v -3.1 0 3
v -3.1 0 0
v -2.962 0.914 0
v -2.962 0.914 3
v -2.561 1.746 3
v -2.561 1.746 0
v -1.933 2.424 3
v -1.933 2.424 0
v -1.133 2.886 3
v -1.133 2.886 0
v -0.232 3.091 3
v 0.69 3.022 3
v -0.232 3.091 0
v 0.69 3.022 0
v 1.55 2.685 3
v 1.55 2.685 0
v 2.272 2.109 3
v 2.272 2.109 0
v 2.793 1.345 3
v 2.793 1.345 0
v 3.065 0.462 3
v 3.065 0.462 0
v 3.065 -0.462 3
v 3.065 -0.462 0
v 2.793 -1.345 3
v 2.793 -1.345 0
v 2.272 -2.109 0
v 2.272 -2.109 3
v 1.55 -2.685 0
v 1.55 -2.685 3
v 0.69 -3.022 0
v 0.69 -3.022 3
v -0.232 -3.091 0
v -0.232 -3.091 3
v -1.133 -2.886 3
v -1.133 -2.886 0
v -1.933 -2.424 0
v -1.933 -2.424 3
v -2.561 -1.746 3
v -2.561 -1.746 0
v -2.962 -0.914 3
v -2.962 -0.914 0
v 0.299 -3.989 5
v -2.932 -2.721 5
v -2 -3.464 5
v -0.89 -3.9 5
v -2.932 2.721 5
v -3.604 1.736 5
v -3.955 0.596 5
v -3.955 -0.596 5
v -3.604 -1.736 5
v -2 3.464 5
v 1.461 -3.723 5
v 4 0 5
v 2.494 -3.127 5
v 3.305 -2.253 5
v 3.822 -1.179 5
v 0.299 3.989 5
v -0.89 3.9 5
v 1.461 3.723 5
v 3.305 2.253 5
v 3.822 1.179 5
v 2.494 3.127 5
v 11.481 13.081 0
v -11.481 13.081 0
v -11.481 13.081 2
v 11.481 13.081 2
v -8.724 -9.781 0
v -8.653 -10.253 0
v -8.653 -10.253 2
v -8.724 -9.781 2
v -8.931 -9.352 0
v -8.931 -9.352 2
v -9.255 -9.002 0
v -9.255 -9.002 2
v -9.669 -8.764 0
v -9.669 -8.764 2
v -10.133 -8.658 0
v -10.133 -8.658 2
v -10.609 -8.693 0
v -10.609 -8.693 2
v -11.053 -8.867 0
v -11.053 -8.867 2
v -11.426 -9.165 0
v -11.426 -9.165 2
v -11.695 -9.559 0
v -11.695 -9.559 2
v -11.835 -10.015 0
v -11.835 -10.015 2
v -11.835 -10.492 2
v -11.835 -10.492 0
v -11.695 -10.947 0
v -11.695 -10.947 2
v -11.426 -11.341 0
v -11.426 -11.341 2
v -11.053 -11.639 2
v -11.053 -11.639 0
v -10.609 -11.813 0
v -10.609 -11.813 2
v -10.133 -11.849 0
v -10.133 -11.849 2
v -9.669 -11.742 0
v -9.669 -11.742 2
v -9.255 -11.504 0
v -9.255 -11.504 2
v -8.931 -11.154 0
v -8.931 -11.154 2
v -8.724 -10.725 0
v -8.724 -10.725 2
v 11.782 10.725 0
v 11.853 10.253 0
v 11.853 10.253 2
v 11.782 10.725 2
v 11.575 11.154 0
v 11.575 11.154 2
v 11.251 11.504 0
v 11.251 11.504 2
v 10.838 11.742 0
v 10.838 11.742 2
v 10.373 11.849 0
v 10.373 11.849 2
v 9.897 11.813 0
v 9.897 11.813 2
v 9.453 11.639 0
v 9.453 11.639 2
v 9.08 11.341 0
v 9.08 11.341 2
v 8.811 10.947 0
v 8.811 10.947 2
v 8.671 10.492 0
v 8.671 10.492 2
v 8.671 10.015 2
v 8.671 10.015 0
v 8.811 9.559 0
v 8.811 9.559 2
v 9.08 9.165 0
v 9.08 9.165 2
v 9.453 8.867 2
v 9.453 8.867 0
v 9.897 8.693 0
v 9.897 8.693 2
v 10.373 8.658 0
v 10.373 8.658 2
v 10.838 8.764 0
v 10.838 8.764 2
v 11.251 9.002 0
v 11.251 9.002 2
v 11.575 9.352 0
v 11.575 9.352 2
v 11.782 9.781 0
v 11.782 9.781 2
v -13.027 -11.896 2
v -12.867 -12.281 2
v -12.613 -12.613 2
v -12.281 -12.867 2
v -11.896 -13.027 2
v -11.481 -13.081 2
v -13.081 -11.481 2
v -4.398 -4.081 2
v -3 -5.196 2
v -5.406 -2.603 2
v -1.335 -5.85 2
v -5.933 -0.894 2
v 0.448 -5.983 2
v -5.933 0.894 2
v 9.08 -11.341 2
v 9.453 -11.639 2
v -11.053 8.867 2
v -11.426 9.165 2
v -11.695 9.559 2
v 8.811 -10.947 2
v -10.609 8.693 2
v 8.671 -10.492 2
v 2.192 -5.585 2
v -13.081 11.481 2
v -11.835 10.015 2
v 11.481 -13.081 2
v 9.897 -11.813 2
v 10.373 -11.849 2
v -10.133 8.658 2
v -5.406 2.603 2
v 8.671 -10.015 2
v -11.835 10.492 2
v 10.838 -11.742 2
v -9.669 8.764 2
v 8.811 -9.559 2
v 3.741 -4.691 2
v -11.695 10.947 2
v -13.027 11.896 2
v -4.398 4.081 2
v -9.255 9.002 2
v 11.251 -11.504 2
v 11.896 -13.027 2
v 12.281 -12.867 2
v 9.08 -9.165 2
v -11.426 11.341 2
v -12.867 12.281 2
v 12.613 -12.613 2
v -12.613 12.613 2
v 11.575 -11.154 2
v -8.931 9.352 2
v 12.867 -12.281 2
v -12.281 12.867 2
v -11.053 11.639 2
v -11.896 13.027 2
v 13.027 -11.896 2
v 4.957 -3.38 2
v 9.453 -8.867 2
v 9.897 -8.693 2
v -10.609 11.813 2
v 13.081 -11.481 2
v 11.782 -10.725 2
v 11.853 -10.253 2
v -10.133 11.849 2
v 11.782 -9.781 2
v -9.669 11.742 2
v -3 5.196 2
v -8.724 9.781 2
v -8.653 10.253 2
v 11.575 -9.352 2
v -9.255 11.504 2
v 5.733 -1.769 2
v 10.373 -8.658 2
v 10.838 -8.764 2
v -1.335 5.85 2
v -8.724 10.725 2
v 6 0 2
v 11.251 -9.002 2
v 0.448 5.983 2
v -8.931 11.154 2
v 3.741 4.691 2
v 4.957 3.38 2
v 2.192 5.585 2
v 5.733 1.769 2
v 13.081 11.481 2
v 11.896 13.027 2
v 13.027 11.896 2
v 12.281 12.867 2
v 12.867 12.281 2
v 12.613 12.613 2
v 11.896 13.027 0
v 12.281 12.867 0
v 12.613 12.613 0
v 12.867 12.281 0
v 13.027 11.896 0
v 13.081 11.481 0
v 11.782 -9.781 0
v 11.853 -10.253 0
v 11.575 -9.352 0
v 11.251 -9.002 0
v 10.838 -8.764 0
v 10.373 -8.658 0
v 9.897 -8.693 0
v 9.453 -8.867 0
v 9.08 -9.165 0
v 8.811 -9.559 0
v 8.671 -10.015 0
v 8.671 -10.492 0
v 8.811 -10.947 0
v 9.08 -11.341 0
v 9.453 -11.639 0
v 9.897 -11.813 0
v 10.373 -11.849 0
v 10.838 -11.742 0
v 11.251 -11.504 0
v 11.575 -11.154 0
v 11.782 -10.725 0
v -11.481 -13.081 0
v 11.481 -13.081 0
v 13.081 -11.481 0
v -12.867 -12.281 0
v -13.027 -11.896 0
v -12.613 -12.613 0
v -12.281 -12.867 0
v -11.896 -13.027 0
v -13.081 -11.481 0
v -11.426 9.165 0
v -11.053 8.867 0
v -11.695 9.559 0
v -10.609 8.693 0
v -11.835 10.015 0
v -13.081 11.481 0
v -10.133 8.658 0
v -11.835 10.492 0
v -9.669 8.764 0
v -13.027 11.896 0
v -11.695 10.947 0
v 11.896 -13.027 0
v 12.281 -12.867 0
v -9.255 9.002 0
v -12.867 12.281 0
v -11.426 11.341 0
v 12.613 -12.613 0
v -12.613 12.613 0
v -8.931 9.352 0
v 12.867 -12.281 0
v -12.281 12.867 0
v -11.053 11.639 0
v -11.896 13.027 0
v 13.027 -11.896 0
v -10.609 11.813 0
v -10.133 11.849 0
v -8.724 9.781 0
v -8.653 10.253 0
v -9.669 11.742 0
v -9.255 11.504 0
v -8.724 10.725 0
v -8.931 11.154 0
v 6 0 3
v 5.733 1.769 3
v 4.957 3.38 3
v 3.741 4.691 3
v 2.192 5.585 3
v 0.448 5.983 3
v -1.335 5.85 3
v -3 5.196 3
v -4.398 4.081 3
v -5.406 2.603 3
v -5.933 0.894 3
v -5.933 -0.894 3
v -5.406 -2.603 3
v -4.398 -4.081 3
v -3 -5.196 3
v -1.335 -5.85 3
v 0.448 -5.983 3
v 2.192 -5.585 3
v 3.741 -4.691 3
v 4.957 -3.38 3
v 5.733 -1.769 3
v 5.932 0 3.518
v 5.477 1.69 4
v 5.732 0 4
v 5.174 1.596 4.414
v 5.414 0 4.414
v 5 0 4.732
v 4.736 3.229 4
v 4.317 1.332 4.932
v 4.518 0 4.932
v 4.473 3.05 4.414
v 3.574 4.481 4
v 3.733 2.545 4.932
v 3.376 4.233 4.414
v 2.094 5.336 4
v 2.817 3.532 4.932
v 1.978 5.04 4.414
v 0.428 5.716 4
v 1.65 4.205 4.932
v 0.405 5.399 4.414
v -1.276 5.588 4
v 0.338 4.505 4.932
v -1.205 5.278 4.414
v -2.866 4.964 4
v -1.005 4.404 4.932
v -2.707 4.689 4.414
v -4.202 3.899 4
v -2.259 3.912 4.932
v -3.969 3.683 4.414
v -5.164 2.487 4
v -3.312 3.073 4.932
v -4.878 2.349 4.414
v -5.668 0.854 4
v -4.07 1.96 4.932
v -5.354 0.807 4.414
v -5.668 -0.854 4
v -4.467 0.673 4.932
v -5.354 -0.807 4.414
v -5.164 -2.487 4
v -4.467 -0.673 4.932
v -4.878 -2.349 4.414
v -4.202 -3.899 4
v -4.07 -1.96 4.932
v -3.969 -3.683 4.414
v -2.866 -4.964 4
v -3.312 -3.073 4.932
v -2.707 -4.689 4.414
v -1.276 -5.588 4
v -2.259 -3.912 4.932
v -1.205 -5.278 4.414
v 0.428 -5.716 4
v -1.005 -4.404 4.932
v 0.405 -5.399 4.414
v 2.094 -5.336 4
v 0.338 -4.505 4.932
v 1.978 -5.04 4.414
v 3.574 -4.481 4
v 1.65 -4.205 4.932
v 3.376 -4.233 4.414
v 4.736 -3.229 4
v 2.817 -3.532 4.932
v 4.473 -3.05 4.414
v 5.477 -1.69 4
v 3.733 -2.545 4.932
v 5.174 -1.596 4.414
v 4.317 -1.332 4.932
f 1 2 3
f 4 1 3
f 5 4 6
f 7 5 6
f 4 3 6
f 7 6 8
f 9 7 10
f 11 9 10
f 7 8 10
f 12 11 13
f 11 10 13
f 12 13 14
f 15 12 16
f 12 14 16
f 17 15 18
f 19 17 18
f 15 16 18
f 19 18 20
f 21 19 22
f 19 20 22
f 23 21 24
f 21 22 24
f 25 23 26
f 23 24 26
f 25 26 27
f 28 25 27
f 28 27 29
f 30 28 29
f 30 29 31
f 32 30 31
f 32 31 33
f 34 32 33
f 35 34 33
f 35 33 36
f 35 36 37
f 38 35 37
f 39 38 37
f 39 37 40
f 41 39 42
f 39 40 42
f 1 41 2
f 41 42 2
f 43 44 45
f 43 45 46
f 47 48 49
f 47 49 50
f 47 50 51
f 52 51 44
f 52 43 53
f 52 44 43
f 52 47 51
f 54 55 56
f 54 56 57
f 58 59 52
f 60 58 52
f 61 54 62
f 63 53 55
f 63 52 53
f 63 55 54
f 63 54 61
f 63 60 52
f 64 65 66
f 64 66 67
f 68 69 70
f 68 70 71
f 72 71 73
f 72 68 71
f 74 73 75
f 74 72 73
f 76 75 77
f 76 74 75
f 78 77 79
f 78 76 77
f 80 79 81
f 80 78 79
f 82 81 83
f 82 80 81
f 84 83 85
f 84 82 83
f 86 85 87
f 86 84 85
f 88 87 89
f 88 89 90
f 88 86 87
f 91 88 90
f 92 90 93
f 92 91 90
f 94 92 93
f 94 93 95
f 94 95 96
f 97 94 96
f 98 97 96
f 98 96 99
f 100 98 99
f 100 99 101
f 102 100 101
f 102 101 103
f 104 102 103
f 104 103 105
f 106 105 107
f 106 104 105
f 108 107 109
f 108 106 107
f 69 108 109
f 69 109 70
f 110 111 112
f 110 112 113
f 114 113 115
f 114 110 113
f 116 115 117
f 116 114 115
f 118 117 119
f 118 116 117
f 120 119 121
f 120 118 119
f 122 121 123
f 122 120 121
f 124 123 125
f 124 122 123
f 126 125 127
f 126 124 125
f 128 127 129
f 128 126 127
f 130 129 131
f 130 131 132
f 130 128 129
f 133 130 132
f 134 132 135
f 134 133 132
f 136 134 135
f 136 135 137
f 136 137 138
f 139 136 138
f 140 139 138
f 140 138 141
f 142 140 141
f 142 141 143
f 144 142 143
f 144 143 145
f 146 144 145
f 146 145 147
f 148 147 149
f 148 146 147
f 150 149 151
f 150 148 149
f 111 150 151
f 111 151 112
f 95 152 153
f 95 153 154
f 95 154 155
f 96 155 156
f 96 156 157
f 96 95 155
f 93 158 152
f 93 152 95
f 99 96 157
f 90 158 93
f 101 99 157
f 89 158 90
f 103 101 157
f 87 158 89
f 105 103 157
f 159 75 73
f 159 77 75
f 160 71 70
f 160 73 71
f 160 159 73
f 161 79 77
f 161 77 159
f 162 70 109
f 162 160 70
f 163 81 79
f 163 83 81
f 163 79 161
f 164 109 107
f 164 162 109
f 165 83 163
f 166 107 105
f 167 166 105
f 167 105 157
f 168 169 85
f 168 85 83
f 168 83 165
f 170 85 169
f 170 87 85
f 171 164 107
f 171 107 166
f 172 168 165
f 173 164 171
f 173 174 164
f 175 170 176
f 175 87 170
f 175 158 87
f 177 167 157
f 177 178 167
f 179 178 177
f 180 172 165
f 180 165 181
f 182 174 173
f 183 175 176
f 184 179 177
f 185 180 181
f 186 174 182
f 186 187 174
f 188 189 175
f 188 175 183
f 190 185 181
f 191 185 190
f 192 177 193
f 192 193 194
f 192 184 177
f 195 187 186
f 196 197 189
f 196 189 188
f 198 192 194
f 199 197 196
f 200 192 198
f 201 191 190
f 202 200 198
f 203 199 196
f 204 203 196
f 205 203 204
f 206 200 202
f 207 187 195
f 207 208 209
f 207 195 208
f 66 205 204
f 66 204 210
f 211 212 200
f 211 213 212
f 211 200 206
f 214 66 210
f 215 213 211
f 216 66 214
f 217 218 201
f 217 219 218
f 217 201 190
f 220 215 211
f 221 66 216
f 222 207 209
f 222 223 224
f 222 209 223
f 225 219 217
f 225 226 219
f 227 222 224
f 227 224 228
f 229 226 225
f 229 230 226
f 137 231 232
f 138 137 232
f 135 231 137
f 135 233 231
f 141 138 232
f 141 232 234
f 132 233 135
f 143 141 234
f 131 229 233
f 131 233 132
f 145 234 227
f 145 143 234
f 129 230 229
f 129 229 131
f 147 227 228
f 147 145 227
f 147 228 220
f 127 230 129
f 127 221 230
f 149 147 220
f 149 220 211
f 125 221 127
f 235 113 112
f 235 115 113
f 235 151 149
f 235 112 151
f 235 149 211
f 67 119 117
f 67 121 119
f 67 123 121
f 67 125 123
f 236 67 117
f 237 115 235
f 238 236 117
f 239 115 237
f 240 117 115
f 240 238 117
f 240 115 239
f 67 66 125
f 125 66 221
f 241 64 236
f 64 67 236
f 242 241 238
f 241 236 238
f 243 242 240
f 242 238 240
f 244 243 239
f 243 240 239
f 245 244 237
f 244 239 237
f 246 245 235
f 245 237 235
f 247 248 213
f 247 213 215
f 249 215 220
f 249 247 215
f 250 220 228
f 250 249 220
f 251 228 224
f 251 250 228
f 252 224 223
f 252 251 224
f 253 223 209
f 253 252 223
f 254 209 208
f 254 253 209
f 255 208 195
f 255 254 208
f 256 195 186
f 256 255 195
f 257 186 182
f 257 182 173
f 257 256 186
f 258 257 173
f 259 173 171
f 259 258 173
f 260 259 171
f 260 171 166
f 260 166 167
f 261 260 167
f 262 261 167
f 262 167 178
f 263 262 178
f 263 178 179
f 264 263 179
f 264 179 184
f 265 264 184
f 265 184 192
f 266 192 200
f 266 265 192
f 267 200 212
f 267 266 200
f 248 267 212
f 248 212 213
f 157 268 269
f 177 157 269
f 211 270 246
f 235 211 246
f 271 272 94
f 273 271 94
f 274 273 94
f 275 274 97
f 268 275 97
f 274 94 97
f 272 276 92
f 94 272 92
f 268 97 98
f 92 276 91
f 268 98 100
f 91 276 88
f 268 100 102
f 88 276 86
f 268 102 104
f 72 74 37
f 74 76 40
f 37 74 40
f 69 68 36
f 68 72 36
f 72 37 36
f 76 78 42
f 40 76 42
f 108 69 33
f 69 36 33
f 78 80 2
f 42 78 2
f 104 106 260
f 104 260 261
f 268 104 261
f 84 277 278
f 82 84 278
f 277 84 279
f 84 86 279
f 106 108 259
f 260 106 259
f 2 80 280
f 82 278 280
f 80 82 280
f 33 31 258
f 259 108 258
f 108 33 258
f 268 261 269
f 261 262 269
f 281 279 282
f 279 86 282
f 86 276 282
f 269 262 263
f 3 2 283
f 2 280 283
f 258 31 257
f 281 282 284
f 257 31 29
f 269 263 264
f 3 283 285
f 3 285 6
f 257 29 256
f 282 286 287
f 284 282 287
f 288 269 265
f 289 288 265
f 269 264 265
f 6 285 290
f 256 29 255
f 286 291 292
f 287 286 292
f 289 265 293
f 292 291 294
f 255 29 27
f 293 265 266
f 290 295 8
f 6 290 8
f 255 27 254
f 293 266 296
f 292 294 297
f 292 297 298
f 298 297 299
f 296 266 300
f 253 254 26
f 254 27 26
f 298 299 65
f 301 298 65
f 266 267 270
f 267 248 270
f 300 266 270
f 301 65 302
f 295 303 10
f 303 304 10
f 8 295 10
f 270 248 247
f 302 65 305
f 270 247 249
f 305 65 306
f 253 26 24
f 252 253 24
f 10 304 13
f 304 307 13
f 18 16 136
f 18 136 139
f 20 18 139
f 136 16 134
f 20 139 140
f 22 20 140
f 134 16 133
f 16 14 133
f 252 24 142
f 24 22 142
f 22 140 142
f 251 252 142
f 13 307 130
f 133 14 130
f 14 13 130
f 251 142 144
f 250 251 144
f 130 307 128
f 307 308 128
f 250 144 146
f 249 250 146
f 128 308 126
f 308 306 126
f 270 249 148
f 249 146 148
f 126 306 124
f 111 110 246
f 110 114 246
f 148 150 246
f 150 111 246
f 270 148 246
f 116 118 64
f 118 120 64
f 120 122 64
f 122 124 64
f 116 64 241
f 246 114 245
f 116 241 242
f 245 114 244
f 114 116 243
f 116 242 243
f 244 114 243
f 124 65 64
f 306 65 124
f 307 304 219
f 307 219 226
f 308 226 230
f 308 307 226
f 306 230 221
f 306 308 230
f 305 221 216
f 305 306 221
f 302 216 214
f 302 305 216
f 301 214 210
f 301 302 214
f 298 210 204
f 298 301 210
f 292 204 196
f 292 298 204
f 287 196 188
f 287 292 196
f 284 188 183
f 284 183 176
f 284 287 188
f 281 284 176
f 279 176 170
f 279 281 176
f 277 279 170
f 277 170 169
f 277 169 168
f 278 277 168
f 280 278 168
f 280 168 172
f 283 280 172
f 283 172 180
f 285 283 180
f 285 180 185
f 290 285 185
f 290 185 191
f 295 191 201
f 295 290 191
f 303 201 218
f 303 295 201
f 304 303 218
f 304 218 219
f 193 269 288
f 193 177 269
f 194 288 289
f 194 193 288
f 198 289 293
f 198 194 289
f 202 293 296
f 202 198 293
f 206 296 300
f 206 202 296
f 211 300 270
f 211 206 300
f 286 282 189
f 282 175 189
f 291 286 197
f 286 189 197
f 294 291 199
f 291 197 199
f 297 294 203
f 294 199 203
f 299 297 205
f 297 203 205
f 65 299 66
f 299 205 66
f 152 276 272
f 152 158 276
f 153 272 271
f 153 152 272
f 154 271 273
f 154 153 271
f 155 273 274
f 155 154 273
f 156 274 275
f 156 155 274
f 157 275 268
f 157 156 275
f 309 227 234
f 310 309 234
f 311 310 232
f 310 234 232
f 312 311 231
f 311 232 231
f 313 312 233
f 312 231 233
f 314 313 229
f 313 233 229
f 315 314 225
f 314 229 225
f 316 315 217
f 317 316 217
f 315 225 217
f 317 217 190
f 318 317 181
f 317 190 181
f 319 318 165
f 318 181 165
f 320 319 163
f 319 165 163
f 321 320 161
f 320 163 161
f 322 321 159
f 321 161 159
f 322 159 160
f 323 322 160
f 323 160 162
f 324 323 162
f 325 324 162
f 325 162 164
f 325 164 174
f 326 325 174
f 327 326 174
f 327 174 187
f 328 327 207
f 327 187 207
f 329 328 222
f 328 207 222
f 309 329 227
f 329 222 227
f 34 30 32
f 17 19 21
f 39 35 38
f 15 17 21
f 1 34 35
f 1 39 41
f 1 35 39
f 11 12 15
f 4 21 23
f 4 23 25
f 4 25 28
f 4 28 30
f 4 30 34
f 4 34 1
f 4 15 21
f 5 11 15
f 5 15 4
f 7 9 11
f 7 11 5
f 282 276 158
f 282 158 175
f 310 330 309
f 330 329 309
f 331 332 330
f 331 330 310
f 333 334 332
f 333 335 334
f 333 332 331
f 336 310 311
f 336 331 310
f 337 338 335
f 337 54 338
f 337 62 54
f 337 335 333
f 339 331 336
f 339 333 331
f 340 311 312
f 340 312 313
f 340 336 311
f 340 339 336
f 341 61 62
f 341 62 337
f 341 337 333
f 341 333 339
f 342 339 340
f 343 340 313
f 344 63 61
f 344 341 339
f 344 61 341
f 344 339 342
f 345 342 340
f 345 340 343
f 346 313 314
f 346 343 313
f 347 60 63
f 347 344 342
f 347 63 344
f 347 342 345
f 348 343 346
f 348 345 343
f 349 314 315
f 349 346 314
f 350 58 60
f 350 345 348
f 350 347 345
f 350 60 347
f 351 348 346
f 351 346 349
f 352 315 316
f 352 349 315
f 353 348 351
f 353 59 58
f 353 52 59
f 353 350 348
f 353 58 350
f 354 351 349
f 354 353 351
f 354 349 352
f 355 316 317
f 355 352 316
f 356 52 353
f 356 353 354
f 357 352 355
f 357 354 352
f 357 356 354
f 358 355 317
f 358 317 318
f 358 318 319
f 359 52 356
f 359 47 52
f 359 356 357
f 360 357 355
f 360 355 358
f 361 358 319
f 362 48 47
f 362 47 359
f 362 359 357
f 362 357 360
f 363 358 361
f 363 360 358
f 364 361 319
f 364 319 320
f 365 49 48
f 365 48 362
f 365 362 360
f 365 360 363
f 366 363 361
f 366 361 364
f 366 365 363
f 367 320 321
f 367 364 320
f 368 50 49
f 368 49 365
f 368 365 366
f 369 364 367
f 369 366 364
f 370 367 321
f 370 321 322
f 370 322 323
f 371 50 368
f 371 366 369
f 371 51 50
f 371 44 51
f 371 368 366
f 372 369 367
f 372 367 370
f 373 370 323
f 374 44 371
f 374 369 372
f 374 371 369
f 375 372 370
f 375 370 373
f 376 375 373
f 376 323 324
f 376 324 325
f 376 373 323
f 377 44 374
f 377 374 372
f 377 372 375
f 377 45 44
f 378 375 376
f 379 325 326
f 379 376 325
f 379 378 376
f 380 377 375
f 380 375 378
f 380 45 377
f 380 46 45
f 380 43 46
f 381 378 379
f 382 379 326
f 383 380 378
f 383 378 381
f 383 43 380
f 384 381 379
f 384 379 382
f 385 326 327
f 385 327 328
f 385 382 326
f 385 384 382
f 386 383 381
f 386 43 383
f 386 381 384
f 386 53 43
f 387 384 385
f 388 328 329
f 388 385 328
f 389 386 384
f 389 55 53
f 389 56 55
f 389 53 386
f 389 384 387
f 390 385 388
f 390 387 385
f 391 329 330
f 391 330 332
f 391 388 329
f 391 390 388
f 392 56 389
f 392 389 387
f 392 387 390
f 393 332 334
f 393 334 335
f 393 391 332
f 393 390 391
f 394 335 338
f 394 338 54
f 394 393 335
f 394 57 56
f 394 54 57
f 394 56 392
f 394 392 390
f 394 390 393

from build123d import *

# Parameters (mm, degrees)
SKETCH_1_W          = 26.162950904
SKETCH_1_H          = 26.162950904
SKETCH_1_R          = 1.6
EXTRUDE_1_DEPTH     = 2
SKETCH_2_R          = 6
EXTRUDE_2_DEPTH     = 3
SKETCH_3_R          = 3.1
CUT_EXTRUDE_1_DEPTH = 3
FILLET_2_R          = 2
FILLET_3_R          = 1.6


with BuildPart() as part:
    # 草图1 → 凸台-拉伸1 (new body)
    with BuildSketch(Plane.XY):
        Rectangle(SKETCH_1_W, SKETCH_1_H)
        with Locations((10.253048327, 10.253048327)):
            Circle(SKETCH_1_R, mode=Mode.SUBTRACT)
        with Locations((-10.253048327, 10.253048327)):
            Circle(SKETCH_1_R, mode=Mode.SUBTRACT)
        with Locations((-10.253048327, -10.253048327)):
            Circle(SKETCH_1_R, mode=Mode.SUBTRACT)
        with Locations((10.253048327, -10.253048327)):
            Circle(SKETCH_1_R, mode=Mode.SUBTRACT)
    extrude(amount=EXTRUDE_1_DEPTH)

    # 草图2 → 凸台-拉伸2 (add)
    with BuildSketch(Plane.XY.offset(2)):
        Circle(SKETCH_2_R)
    extrude(amount=EXTRUDE_2_DEPTH)

    # 草图3 → 切除-拉伸1 (cut)
    with BuildSketch(Plane(origin=(0, 0, 0), x_dir=(-1, 0, 0), z_dir=(0, 0, -1))):
        Circle(SKETCH_3_R)
    extrude(amount=-CUT_EXTRUDE_1_DEPTH, mode=Mode.SUBTRACT)

    # 圆角2
    fillet_2_edges = [part.edges().sort_by_distance(p)[0] for p in [
        (-6, 0, 5),
    ]]
    fillet(fillet_2_edges, radius=FILLET_2_R)

    # 圆角3
    fillet_3_edges = [part.edges().sort_by_distance(p)[0] for p in [
        (13.081475452, -13.081475452, 1),
        (-13.081475452, -13.081475452, 1),
        (-13.081475452, 13.081475452, 1),
        (13.081475452, 13.081475452, 1),
    ]]
    fillet(fillet_3_edges, radius=FILLET_3_R)


solid = part.part
